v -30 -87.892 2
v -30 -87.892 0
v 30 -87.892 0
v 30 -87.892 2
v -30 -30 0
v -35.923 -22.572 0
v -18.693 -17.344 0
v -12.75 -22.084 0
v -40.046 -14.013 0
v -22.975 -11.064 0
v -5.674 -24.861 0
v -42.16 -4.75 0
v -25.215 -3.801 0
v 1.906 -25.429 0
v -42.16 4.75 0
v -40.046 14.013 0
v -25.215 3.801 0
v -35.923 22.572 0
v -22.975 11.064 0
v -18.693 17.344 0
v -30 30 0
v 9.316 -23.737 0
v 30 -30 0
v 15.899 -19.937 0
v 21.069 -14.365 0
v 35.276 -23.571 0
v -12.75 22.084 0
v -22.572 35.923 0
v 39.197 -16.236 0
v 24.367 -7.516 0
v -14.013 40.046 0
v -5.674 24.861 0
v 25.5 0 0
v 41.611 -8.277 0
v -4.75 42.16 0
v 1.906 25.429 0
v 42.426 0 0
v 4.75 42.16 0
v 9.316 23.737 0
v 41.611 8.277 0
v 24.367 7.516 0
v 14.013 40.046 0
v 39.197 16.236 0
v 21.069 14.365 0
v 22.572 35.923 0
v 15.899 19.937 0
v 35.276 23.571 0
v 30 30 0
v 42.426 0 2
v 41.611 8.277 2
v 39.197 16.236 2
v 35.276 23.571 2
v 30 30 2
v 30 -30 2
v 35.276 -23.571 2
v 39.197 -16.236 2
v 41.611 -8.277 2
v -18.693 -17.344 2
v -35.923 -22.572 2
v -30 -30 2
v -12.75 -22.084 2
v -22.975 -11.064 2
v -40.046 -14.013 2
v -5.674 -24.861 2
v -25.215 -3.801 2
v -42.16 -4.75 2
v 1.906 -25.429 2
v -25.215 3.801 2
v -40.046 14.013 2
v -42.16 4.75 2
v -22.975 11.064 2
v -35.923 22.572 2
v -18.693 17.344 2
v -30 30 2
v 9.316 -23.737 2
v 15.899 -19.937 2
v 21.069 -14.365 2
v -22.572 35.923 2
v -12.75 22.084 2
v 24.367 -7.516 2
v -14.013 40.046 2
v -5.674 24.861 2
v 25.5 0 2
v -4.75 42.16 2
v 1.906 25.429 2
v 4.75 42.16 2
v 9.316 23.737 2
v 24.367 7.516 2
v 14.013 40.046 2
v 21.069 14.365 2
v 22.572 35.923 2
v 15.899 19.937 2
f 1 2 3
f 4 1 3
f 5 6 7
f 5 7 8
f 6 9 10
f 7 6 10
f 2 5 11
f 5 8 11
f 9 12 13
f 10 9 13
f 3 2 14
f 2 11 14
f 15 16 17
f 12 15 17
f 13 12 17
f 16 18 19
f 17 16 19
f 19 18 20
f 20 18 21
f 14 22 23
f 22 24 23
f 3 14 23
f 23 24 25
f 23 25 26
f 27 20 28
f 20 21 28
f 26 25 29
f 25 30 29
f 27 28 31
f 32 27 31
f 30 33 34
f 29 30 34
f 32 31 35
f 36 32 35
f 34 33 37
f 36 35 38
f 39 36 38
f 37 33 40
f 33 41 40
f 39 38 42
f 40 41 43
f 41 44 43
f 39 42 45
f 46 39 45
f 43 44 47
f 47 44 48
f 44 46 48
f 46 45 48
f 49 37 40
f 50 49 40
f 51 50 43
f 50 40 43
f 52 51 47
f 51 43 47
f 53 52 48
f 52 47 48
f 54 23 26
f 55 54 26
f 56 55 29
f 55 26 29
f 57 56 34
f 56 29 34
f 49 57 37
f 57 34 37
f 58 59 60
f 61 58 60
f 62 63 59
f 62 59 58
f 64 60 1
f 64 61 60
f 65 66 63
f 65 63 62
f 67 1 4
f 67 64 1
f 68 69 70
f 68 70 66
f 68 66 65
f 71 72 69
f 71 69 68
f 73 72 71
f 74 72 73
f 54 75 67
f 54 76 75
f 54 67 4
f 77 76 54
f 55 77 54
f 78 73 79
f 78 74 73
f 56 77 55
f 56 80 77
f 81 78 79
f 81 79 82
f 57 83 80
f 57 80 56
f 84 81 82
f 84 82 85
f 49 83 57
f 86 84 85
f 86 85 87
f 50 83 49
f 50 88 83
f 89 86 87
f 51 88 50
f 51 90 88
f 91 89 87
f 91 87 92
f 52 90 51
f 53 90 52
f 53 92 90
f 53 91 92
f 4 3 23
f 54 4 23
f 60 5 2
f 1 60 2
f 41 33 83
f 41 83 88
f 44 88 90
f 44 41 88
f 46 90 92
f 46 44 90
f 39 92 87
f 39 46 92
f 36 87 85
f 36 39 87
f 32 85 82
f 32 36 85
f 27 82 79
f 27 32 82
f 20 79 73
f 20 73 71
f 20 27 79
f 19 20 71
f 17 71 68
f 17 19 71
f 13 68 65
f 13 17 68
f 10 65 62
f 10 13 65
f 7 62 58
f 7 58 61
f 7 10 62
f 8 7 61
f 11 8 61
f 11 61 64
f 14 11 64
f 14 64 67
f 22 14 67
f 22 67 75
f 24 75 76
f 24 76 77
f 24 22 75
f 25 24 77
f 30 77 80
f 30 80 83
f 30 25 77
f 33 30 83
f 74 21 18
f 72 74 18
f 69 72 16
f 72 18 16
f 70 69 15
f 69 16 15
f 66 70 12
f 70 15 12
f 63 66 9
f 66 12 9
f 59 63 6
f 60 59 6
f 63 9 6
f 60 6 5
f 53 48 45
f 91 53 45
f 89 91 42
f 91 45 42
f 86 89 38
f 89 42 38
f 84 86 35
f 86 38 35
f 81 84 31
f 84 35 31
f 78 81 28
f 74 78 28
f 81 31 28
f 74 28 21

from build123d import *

# Parameters (mm, degrees)
SKETCH_1_R      = 25.5
EXTRUDE_1_DEPTH = 2


with BuildPart() as part:
    # 草图1 → 凸台-拉伸1 (new body)
    # profile 1 of 5: a face of its own
    with BuildSketch(Plane.XY):
        with BuildLine():
            Line((-30, -30), (-30, -87.891535797))
            Line((-30, -87.891535797), (30, -87.891535797))
            Line((30, -87.891535797), (30, -30))
            ThreePointArc((30, -30), (0, -42.426406871), (-30, -30))
        make_face()
    # profile 2 of 5: a face of its own
    with BuildSketch(Plane.XY):
        with BuildLine():
            Line((-30, 30), (-30, -30))
            ThreePointArc((-30, -30), (0, -42.426406871), (30, -30))
            Line((30, -30), (30, 30))
            Line((30, 30), (-30, 30))
        make_face()
        Circle(SKETCH_1_R, mode=Mode.SUBTRACT)
    # profile 3 of 5: a face of its own
    with BuildSketch(Plane.XY):
        with BuildLine():
            ThreePointArc((-30, 30), (-42.426406871, 0), (-30, -30))
            Line((-30, -30), (-30, 30))
        make_face()
    # profile 4 of 5: a face of its own
    with BuildSketch(Plane.XY):
        with BuildLine():
            Line((30, 30), (30, -30))
            ThreePointArc((30, -30), (39.196888946, -16.235883004), (42.426406871, 0))
            ThreePointArc((42.426406871, 0), (39.196888946, 16.235883004), (30, 30))
        make_face()
    # profile 5 of 5: a face of its own
    with BuildSketch(Plane.XY):
        with BuildLine():
            ThreePointArc((30, 30), (0, 42.426406871), (-30, 30))
            Line((-30, 30), (30, 30))
        make_face()
    extrude(amount=EXTRUDE_1_DEPTH)


solid = part.part
